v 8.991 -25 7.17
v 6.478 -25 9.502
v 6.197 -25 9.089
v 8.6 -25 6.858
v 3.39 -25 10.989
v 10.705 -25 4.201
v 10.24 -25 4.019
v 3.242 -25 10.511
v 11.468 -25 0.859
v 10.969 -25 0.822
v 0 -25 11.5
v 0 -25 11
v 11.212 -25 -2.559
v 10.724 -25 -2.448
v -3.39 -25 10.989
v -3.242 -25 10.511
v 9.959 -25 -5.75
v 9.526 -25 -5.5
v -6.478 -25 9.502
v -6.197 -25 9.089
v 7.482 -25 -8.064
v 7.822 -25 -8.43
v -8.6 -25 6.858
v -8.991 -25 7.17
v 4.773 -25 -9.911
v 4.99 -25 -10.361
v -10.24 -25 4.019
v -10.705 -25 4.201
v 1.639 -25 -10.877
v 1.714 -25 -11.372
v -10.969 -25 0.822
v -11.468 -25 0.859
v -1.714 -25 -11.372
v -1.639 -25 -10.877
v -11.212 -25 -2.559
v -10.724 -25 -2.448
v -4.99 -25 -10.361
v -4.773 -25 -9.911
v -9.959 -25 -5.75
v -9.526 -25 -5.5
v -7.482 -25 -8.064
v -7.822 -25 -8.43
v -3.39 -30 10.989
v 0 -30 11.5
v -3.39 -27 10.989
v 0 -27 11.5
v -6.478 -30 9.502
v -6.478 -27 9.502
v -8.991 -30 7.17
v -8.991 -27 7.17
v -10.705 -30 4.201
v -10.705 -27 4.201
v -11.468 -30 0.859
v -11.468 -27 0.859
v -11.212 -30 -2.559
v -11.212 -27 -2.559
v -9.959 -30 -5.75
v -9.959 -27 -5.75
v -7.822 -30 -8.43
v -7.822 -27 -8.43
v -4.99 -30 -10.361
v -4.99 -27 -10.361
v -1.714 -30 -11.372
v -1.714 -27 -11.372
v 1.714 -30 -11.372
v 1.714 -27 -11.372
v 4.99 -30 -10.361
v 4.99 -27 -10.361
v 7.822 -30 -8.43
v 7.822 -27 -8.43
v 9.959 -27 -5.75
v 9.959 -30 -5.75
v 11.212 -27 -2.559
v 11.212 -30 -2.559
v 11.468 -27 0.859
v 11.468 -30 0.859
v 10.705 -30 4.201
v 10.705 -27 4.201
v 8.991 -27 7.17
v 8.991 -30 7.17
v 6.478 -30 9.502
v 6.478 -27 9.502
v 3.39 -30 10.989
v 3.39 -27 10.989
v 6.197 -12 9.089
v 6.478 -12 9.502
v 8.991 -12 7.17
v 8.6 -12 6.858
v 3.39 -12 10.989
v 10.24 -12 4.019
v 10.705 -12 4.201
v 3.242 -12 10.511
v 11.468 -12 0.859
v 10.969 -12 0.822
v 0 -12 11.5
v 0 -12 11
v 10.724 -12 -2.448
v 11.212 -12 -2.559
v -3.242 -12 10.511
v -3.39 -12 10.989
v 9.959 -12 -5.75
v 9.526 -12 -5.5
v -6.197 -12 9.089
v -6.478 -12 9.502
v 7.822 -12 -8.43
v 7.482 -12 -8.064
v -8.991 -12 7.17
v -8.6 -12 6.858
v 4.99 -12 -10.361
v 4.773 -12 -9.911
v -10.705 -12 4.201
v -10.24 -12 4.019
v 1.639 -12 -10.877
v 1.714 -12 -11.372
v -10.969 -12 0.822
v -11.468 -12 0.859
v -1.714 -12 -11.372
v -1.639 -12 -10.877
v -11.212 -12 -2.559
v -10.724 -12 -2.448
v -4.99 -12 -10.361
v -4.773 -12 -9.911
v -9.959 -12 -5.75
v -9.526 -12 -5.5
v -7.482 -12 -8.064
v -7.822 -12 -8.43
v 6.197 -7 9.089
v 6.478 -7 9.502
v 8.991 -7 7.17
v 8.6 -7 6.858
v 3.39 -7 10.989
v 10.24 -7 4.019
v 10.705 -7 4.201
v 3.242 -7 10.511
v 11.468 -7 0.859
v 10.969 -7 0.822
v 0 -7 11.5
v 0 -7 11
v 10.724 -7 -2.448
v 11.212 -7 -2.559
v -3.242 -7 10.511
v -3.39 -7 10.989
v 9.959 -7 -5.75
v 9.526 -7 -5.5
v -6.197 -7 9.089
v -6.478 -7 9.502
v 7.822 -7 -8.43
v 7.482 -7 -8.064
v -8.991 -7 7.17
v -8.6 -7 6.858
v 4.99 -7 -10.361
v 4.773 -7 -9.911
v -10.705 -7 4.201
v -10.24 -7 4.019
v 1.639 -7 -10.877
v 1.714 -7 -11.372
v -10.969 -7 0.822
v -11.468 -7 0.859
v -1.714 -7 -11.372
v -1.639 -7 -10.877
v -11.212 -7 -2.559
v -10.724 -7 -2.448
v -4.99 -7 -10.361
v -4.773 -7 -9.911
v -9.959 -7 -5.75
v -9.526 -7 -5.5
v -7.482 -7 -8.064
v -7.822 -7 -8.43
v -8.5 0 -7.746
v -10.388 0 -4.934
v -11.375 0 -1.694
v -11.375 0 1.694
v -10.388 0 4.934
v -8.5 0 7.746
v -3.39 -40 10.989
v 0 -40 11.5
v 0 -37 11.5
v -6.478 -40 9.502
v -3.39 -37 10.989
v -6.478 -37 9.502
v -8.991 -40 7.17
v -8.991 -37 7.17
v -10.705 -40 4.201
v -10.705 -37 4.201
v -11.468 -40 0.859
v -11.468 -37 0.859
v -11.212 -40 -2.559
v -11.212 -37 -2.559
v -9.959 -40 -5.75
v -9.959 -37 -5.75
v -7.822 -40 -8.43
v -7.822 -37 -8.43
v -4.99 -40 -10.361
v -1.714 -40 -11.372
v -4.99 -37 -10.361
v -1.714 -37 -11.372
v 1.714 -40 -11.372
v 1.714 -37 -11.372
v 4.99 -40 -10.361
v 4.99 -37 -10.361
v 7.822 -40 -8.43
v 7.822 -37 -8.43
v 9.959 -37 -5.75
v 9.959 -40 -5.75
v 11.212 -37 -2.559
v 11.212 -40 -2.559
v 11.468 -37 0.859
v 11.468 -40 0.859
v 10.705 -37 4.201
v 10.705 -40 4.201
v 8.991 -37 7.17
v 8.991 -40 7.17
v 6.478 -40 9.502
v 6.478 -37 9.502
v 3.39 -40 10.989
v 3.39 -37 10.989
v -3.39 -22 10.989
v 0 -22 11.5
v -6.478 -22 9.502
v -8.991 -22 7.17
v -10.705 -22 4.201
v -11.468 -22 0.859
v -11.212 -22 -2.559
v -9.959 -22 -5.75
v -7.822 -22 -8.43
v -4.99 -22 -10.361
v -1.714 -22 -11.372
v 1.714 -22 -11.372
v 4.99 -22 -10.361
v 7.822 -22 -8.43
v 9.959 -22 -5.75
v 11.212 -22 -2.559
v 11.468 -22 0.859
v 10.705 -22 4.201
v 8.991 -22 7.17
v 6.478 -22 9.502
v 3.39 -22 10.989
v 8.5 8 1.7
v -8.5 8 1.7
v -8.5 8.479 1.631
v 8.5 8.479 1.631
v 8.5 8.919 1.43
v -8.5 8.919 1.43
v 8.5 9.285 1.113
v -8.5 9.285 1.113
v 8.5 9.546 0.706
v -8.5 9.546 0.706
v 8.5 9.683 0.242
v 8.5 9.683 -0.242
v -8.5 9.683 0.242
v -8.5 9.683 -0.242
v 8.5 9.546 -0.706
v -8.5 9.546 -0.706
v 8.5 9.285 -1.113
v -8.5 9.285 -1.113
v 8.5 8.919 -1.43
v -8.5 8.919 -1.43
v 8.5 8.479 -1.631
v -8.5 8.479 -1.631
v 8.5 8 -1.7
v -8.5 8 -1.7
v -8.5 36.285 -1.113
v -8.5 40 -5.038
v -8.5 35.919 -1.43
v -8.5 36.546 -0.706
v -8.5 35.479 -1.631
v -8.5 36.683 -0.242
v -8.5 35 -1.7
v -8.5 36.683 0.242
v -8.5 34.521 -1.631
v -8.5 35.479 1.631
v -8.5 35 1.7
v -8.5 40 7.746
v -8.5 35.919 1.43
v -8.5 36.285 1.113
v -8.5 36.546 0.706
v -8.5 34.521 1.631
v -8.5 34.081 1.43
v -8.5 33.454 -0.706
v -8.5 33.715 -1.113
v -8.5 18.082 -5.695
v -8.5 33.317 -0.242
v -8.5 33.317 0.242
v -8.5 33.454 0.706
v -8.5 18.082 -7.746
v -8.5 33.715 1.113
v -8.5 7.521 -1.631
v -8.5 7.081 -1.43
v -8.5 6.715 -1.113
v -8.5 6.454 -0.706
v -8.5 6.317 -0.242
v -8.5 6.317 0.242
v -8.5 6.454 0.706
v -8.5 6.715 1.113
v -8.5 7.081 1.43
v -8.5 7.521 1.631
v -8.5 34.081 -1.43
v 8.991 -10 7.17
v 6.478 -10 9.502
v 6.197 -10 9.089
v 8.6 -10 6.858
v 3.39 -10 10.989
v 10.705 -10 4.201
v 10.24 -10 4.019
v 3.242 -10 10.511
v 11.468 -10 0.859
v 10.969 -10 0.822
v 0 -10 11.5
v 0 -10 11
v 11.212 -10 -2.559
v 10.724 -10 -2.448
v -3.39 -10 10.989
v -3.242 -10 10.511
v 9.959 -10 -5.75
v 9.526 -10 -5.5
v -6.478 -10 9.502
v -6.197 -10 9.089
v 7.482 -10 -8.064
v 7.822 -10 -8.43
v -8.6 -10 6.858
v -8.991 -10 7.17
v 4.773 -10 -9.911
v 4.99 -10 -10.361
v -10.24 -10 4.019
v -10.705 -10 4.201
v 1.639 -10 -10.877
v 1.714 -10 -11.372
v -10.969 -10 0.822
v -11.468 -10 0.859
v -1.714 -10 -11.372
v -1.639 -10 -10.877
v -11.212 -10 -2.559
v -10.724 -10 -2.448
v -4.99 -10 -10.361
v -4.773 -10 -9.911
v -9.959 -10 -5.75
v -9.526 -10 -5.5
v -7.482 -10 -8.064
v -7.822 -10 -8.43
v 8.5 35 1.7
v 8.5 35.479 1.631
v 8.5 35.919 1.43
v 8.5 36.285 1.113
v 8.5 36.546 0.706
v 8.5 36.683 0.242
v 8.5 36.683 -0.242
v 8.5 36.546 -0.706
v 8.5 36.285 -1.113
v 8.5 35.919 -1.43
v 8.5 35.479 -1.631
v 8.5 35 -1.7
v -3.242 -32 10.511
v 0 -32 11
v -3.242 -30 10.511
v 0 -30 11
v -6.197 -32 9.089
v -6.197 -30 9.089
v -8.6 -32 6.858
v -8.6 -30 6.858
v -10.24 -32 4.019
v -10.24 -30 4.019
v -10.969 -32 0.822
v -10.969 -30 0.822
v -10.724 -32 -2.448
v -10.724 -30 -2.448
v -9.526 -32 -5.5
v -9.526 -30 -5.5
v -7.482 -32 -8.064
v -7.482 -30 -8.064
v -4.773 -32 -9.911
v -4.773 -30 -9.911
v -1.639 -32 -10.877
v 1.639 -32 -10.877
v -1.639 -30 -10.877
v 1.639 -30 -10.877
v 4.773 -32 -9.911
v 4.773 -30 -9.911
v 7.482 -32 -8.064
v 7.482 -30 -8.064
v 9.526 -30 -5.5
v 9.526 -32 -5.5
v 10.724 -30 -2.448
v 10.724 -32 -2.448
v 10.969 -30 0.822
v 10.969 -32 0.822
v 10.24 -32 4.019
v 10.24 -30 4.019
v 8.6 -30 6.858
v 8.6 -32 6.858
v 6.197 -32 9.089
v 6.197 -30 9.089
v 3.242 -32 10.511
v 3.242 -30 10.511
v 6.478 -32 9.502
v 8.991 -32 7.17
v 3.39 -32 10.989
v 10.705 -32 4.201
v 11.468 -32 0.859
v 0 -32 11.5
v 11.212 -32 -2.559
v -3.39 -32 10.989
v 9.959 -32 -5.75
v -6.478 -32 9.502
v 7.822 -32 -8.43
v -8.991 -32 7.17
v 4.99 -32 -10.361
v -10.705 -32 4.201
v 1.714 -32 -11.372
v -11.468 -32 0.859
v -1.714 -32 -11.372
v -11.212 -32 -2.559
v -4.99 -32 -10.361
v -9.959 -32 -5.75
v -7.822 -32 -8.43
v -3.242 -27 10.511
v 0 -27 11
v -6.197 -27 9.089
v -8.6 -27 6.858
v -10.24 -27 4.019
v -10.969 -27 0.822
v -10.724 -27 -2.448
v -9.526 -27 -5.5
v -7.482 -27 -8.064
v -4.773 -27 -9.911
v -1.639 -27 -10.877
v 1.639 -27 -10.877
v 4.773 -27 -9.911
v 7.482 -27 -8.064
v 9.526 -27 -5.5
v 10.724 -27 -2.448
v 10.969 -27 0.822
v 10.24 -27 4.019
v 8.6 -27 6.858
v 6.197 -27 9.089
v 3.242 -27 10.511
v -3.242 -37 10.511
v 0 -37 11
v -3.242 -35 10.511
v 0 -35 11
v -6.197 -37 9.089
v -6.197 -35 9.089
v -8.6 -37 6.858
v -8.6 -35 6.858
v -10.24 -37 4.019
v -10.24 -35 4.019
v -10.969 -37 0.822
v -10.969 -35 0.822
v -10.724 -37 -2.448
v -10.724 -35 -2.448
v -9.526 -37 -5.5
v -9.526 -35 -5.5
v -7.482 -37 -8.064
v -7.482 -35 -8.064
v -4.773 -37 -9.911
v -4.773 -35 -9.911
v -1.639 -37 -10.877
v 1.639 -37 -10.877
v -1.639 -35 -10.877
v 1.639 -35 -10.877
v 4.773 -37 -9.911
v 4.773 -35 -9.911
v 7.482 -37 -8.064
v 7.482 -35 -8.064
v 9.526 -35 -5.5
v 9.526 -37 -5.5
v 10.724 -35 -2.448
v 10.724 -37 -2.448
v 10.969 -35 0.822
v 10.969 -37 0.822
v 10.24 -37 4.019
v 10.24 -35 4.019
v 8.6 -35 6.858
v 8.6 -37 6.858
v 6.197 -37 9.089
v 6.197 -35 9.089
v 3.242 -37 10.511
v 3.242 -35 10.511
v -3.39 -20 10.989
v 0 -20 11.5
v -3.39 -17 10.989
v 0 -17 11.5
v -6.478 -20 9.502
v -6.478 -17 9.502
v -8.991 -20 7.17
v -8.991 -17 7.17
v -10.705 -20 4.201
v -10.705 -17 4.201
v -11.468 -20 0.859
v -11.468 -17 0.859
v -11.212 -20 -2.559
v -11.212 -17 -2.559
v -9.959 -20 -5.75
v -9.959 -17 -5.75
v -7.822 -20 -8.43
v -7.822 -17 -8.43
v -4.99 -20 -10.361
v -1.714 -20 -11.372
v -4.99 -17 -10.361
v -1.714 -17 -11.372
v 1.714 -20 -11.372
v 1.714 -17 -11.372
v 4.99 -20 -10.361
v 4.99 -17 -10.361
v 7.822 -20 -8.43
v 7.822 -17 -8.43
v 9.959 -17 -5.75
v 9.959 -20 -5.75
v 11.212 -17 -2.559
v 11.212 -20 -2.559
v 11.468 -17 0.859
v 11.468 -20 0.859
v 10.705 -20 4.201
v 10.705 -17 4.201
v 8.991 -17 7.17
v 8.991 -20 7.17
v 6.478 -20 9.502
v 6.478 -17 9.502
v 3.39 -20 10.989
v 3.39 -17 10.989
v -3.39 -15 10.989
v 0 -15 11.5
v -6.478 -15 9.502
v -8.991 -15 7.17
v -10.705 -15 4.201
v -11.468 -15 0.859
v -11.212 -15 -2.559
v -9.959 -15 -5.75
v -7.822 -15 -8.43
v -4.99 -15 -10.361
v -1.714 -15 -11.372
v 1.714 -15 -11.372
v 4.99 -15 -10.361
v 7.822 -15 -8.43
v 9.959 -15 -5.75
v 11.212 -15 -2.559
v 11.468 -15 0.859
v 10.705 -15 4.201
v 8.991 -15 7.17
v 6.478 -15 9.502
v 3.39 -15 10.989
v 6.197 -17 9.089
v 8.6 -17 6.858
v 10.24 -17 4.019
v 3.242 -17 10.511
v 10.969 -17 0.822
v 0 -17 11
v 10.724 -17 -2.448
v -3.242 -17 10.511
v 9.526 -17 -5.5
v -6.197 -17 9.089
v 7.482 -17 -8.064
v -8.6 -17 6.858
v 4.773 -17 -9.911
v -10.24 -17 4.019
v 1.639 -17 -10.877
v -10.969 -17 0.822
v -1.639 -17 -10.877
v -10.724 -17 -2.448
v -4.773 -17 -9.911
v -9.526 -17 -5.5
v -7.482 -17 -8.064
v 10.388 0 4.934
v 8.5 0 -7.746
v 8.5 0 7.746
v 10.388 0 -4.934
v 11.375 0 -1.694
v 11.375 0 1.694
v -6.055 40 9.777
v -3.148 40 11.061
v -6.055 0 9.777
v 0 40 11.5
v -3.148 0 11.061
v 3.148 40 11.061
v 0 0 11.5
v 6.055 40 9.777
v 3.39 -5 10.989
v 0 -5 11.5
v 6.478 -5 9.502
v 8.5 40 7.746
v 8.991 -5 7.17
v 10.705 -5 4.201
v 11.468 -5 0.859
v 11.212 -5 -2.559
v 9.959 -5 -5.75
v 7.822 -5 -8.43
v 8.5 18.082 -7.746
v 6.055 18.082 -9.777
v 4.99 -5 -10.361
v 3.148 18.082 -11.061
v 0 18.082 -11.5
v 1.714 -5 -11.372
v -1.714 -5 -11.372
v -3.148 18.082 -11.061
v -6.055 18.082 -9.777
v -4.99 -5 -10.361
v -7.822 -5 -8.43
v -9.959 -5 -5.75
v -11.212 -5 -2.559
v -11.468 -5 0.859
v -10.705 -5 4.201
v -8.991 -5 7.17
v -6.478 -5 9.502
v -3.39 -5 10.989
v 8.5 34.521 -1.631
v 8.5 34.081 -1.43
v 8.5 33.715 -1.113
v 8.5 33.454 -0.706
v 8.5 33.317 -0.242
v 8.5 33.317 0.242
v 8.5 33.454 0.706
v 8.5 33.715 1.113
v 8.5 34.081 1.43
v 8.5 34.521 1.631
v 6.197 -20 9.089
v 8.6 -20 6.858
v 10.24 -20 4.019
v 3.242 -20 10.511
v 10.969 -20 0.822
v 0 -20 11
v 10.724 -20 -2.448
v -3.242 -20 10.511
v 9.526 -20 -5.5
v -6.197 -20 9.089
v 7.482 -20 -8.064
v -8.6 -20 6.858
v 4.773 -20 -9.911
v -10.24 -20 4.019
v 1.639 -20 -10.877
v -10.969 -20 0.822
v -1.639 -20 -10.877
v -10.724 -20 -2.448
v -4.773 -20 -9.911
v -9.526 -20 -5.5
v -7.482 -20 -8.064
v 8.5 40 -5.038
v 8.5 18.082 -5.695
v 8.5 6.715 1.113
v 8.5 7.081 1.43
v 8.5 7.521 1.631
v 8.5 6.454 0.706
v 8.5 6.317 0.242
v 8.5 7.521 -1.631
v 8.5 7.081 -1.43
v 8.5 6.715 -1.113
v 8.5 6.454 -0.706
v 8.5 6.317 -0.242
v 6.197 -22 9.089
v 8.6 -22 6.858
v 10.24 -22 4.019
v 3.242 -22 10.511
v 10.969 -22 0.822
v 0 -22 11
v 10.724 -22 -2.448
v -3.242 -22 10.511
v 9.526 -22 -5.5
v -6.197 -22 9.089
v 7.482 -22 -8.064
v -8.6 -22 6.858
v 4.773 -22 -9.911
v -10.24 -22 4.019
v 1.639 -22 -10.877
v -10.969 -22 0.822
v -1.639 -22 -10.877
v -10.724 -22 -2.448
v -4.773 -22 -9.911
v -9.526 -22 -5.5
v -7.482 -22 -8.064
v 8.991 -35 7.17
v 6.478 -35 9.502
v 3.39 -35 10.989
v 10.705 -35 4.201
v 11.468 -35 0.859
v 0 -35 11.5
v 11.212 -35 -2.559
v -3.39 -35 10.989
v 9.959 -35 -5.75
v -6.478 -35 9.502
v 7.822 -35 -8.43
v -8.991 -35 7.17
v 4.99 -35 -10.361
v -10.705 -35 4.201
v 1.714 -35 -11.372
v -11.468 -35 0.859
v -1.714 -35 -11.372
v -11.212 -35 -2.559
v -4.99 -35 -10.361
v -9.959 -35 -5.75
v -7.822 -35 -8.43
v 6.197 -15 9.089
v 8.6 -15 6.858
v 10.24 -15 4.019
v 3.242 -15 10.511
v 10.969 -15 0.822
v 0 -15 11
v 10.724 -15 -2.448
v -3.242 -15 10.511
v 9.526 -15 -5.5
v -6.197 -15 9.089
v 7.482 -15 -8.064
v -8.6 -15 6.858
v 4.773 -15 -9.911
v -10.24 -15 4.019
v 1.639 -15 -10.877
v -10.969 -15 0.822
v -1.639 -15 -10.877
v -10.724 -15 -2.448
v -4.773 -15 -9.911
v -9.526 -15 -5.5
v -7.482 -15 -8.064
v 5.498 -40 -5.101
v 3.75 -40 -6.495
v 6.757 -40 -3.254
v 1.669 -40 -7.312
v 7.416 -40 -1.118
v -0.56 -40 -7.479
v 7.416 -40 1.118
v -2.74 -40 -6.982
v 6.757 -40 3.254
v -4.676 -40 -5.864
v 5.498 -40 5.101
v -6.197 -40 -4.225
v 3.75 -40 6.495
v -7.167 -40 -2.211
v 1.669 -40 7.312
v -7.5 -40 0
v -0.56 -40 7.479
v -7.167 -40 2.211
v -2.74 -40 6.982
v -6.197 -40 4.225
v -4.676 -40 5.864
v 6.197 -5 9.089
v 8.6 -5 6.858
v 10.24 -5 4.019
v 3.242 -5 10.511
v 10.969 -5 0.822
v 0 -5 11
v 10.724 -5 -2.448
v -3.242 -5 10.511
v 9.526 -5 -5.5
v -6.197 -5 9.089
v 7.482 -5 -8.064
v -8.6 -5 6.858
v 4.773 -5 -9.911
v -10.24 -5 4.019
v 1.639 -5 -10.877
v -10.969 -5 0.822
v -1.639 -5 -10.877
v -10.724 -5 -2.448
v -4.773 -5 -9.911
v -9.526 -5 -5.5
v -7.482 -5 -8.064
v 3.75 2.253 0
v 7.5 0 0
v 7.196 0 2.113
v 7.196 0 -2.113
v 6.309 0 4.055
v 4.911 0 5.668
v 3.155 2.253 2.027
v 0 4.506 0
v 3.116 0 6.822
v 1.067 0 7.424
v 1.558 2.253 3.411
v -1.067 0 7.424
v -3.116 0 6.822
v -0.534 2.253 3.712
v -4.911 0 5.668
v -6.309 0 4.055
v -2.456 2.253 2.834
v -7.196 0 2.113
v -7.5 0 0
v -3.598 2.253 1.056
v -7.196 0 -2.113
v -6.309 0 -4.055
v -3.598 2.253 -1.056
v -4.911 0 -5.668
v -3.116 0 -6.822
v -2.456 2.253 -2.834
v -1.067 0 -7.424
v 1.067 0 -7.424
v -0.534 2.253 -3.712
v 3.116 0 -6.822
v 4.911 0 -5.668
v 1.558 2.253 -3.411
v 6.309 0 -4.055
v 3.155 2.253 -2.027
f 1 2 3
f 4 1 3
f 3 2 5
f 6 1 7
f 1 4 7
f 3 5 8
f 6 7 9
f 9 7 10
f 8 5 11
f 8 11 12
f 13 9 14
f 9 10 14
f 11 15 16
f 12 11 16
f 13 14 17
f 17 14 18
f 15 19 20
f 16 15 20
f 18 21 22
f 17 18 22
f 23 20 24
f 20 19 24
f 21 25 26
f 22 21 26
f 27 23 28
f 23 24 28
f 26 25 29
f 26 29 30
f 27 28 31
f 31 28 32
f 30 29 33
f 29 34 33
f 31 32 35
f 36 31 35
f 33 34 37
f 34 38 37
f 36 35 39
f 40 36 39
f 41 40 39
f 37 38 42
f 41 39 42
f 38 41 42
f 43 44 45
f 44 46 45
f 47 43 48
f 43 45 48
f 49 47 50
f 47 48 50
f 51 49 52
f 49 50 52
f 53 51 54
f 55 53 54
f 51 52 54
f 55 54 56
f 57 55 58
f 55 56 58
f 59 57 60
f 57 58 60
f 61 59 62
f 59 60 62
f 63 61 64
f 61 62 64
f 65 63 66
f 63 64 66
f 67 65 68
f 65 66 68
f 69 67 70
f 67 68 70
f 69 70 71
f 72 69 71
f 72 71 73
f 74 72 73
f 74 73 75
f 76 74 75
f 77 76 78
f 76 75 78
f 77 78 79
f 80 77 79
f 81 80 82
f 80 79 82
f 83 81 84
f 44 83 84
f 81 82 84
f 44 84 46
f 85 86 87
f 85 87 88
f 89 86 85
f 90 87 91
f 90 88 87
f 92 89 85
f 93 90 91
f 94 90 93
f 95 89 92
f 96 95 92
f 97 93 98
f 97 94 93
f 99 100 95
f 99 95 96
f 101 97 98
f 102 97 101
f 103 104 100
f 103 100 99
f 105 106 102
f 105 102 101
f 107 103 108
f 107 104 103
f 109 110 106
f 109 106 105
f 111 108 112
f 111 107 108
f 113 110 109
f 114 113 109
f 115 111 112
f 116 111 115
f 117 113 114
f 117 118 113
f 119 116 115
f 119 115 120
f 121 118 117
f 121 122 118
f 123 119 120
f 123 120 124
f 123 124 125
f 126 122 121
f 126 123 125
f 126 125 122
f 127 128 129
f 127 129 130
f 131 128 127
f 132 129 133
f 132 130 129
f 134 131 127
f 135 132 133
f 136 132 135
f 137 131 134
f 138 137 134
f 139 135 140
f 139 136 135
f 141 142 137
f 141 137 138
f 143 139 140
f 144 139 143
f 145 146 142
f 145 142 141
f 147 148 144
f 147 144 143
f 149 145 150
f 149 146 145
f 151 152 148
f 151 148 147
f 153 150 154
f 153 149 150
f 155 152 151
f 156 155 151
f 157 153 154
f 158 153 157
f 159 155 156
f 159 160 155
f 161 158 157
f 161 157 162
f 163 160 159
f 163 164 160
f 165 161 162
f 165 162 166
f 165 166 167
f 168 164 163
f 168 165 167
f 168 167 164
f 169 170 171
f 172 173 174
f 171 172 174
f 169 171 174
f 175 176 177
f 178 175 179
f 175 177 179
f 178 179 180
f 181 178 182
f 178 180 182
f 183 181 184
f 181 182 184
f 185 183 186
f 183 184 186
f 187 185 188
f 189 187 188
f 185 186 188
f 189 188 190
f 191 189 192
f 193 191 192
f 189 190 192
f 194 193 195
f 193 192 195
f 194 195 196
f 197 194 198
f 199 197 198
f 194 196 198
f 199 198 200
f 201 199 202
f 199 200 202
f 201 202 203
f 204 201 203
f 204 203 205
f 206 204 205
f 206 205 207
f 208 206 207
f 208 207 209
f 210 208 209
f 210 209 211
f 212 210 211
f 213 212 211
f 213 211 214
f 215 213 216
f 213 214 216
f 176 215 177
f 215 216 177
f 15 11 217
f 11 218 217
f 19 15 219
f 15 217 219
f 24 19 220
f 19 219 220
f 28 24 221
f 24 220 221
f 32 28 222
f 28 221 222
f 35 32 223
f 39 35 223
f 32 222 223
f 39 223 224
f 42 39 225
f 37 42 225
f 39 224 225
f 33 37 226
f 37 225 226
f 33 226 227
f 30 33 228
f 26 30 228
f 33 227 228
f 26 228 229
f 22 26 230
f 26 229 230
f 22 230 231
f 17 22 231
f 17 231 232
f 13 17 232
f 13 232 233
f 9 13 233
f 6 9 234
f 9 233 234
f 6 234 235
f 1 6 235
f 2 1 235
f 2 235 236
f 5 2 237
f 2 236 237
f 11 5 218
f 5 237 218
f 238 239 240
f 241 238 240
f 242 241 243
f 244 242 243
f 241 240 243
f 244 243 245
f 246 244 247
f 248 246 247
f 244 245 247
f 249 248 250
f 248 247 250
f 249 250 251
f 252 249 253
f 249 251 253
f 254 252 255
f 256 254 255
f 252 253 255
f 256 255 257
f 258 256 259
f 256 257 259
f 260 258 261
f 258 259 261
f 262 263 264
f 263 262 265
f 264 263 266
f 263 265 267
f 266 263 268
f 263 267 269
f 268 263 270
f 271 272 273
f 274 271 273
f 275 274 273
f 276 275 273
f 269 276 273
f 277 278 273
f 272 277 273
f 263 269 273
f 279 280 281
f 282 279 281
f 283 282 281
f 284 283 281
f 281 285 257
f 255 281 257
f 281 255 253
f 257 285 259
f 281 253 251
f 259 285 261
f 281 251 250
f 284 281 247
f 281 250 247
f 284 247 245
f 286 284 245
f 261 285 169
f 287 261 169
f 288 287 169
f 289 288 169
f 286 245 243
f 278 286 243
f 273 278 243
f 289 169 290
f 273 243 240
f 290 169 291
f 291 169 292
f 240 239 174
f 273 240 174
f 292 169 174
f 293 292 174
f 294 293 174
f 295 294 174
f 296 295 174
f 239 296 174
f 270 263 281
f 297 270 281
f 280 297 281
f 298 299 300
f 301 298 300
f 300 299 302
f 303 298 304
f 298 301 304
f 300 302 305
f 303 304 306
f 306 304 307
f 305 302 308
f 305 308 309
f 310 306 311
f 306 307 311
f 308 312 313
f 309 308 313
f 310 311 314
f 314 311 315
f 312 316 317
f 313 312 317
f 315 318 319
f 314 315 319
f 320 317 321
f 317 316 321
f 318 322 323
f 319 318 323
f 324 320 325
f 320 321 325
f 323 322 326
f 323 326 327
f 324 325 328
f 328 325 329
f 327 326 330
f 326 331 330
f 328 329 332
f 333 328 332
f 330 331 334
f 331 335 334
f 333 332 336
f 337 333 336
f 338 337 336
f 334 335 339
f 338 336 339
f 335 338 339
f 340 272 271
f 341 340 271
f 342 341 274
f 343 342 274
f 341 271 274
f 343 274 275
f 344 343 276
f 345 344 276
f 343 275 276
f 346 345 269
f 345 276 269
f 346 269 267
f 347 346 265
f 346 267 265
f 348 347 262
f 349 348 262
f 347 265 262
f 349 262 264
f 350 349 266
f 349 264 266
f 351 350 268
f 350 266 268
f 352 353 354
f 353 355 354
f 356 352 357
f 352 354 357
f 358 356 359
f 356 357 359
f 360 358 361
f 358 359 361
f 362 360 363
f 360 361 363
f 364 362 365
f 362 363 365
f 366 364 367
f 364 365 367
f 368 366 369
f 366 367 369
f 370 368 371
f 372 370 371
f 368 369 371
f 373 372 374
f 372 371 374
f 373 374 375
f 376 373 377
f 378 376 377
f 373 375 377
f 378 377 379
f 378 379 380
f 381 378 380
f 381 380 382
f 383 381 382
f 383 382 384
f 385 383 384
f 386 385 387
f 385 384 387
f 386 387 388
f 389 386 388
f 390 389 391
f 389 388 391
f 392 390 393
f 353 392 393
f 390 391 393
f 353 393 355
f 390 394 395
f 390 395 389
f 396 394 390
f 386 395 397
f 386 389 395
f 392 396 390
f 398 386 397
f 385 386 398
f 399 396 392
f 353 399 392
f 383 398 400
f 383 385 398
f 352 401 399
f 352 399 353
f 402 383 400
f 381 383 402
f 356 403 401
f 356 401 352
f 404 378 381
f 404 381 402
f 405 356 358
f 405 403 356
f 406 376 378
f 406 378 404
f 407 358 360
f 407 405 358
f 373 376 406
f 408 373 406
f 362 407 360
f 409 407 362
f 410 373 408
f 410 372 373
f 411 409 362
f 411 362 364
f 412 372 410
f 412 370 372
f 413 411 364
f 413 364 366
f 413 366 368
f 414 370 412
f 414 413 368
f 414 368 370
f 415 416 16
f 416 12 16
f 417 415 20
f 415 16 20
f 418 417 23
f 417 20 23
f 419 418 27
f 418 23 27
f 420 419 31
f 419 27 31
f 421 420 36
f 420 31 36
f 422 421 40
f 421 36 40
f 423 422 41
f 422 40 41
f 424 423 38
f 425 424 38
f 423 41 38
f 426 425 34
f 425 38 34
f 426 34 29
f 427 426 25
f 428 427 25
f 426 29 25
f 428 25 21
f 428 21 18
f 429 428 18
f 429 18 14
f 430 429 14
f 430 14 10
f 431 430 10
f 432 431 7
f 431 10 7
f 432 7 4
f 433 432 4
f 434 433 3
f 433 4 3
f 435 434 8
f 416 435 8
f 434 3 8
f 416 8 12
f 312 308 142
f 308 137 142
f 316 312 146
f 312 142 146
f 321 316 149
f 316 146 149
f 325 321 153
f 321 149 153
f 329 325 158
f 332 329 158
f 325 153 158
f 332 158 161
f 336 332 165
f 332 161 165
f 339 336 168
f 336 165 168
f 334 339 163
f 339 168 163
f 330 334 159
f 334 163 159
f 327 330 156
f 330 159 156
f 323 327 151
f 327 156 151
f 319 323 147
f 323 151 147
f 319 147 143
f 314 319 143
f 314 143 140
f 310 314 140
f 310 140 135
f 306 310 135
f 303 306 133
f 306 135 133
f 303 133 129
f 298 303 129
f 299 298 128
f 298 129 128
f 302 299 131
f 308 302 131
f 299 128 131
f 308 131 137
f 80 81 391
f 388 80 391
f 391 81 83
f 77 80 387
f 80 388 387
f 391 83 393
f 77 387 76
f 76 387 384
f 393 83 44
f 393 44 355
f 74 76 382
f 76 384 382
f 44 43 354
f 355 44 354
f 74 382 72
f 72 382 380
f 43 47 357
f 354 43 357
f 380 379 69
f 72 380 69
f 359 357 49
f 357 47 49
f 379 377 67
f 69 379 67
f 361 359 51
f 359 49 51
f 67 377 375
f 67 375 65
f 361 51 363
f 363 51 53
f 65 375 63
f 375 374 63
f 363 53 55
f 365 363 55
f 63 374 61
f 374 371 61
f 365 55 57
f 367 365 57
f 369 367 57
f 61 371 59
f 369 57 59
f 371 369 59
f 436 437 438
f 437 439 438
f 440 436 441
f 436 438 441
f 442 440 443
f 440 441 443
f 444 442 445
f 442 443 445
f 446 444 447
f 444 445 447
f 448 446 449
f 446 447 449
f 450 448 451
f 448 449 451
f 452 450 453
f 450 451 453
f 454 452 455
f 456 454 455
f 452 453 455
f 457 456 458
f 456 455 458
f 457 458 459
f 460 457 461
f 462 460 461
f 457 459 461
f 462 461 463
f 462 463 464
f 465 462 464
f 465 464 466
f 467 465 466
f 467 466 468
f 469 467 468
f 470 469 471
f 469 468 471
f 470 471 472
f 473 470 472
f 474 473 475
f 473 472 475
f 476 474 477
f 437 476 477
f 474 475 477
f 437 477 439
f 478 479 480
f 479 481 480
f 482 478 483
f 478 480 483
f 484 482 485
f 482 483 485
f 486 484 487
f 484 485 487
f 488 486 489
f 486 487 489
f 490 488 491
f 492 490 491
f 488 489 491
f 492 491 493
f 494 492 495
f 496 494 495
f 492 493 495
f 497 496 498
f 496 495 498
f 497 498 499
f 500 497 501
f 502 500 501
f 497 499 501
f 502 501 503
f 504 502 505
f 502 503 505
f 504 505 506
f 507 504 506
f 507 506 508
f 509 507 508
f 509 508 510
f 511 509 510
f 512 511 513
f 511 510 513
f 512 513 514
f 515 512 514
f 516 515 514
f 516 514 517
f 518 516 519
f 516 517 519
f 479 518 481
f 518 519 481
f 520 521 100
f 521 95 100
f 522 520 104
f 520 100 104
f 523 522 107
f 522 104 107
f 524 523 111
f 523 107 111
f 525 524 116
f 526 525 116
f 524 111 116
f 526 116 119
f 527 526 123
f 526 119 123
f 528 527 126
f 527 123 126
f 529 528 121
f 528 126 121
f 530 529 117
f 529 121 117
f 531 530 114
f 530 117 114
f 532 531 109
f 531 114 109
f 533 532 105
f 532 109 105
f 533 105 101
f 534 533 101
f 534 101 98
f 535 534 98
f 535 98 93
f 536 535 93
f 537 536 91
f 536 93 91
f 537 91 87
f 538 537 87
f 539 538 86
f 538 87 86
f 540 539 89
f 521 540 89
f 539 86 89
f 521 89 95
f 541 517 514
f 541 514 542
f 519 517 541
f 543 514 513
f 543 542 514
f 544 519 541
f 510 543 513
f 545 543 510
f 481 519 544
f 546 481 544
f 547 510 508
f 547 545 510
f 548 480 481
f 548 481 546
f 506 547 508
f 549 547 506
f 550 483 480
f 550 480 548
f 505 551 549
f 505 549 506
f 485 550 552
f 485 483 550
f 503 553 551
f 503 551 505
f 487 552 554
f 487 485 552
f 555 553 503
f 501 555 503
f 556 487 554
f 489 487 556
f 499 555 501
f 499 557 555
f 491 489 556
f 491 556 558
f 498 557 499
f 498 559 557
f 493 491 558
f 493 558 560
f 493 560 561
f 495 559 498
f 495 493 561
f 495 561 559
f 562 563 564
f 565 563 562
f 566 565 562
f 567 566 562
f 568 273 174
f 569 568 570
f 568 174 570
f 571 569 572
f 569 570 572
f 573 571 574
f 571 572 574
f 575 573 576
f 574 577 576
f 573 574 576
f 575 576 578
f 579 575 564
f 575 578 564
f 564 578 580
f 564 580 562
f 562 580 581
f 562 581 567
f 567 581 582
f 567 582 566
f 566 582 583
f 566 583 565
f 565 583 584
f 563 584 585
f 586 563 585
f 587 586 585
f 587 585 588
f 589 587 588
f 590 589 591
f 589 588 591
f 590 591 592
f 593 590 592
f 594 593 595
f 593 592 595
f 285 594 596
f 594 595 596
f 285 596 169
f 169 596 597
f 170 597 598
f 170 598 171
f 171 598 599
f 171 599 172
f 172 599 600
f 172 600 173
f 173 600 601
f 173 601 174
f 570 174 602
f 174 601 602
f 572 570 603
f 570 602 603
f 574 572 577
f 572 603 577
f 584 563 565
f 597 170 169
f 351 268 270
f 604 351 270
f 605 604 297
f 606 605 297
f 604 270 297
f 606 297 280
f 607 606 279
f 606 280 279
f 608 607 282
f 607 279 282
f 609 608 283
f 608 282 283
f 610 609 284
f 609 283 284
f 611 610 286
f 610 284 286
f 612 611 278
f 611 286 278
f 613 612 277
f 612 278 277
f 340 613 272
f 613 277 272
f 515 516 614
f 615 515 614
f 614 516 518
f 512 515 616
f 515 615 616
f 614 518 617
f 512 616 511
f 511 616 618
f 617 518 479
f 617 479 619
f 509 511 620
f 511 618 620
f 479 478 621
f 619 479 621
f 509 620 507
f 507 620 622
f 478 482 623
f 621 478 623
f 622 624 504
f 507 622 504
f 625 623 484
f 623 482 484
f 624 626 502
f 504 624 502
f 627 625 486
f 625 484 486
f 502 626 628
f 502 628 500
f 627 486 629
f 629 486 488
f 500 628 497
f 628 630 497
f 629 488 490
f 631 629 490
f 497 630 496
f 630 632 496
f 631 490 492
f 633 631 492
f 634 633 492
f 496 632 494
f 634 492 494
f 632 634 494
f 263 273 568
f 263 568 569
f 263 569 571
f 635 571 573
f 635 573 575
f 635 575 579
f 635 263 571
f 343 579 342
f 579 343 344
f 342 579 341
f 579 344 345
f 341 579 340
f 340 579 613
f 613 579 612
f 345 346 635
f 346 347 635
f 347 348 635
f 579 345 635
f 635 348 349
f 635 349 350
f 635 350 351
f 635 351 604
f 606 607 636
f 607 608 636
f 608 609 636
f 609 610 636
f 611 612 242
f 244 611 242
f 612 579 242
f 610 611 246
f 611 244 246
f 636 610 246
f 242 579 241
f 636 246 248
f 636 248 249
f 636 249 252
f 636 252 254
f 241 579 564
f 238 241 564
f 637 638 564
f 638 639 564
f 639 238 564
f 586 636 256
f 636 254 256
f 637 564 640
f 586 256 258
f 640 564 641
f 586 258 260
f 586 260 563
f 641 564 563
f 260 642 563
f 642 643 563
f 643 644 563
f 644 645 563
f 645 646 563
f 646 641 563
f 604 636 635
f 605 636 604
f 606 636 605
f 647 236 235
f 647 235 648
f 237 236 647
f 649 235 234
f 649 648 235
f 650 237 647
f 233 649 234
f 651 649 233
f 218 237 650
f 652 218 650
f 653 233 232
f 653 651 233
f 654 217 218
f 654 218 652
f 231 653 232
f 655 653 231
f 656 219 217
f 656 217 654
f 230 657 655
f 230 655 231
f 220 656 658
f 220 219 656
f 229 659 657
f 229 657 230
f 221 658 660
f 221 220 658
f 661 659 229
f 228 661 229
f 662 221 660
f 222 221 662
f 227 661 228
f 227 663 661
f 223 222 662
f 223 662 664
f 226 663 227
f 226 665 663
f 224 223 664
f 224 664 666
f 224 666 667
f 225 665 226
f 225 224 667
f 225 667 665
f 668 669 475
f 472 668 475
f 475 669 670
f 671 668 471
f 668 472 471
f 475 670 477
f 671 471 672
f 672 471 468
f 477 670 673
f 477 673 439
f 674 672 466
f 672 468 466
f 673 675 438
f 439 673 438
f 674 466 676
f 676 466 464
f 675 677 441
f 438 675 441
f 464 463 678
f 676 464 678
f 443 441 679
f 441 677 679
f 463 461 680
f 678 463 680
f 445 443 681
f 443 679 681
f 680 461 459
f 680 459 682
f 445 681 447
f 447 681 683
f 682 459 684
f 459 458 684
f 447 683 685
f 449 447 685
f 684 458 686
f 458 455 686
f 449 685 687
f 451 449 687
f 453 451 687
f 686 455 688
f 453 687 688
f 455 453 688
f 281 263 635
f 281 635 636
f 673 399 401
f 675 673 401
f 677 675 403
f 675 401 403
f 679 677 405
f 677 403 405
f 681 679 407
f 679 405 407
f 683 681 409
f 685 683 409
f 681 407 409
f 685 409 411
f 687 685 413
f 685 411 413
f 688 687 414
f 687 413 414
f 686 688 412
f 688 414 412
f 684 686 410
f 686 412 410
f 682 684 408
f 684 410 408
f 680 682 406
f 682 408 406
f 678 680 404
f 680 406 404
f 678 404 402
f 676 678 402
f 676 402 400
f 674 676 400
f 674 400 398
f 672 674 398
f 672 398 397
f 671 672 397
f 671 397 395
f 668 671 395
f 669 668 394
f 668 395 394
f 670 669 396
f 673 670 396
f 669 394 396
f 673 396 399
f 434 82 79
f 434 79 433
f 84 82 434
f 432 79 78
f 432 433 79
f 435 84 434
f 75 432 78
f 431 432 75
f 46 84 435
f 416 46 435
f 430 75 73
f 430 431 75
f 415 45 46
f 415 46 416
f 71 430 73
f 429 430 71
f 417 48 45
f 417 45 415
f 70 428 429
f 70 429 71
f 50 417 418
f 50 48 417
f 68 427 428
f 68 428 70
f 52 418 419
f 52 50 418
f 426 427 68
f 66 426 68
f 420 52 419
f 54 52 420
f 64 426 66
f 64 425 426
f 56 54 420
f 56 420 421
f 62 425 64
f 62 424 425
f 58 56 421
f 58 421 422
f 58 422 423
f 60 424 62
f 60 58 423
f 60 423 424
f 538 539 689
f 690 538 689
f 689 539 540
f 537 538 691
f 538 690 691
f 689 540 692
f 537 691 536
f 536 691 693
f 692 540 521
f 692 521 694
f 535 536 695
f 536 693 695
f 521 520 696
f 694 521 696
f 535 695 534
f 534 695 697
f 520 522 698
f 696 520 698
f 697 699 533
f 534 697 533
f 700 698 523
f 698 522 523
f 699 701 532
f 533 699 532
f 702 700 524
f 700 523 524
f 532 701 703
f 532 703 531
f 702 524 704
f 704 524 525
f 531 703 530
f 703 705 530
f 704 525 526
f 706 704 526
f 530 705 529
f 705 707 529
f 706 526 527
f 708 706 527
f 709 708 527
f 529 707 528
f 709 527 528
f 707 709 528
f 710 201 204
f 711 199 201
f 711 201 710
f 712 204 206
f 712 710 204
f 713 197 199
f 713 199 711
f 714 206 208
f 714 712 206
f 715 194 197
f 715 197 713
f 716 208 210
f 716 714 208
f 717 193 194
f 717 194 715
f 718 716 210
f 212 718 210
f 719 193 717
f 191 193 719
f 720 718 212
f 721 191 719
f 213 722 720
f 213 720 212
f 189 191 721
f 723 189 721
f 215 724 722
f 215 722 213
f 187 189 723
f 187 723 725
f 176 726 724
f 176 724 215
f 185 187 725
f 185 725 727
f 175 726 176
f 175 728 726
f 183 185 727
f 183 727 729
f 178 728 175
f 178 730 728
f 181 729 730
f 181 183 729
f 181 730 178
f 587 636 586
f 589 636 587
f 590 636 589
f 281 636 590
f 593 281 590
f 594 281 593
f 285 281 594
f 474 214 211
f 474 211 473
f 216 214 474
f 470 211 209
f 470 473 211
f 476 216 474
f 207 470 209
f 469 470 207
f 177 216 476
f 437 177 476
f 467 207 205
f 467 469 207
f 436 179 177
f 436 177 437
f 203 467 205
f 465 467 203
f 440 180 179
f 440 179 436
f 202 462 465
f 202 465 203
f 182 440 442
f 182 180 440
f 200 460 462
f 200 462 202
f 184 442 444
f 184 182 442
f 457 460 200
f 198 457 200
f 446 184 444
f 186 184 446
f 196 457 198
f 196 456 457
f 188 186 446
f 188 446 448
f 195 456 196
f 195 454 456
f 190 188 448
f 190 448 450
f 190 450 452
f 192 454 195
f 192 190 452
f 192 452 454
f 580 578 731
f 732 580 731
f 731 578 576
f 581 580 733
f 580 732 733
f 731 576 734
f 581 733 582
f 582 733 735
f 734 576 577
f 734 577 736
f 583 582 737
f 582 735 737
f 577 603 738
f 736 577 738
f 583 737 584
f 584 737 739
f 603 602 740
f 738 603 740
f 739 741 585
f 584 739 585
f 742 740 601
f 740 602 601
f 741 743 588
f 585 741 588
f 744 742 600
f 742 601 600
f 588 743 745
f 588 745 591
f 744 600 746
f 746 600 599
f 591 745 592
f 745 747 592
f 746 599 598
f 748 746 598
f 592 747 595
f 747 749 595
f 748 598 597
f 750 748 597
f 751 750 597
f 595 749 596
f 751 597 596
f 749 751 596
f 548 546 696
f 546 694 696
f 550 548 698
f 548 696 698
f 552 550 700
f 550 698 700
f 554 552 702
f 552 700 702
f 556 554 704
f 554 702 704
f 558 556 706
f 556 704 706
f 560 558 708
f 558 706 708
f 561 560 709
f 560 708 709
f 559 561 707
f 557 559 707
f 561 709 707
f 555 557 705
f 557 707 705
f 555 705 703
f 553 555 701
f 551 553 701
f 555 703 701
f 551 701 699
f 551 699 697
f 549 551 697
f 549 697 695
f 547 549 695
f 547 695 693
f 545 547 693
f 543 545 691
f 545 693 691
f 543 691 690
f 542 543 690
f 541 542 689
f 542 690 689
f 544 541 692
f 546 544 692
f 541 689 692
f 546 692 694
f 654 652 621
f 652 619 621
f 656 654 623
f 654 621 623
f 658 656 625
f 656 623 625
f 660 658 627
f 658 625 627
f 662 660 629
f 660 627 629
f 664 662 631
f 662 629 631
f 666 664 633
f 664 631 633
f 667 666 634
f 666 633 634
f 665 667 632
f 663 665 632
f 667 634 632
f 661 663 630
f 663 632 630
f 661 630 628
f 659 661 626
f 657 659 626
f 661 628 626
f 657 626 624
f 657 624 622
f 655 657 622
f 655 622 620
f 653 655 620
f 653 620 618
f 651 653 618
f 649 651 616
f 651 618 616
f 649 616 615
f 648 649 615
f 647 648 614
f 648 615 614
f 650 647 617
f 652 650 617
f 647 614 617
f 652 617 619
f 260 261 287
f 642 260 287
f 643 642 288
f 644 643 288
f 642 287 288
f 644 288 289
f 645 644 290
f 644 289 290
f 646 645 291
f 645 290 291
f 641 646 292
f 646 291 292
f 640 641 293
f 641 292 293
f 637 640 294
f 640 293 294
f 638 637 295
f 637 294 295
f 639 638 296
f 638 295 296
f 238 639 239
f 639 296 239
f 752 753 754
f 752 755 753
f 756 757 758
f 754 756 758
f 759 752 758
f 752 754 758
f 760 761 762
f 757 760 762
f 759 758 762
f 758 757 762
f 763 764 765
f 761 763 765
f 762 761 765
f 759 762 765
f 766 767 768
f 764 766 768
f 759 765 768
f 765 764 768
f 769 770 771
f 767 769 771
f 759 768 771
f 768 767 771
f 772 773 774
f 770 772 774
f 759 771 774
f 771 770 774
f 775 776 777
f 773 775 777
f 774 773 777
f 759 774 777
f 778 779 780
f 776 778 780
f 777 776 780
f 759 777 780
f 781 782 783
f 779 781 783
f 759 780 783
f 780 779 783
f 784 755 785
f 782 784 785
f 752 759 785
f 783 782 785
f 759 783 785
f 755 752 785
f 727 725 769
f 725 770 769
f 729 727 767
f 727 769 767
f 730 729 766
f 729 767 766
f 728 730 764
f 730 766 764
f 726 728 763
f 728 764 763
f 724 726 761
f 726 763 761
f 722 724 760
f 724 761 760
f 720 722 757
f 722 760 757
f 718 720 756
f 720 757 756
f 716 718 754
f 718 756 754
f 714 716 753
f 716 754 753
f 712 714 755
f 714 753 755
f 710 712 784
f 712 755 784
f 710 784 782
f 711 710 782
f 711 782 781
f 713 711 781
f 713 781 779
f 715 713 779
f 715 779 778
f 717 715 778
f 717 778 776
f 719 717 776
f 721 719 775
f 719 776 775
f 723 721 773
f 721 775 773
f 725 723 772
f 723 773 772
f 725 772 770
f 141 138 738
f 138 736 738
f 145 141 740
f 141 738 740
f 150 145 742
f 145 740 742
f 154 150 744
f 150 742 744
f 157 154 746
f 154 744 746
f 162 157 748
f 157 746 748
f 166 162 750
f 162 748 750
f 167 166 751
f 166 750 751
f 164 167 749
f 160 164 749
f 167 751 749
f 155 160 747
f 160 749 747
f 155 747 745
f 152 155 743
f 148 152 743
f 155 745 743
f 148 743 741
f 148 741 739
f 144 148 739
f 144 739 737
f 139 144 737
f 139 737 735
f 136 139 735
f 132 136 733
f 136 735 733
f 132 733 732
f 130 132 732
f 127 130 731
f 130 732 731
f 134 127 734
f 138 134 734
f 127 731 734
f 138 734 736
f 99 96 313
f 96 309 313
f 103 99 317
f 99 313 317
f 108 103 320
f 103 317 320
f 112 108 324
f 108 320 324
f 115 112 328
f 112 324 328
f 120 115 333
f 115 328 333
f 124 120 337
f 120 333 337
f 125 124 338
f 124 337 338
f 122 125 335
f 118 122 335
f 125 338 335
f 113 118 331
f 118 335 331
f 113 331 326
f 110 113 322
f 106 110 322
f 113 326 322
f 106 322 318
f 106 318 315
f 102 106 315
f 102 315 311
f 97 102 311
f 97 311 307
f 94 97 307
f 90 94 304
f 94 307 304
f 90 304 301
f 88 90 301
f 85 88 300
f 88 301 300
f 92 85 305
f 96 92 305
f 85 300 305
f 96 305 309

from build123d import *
from build123d.topology import SkipClean

# Parameters (mm, degrees)
SKETCH2_W                      = 11.5
SKETCH2_H                      = 40
SKETCH3_W                      = 0.5
SKETCH3_H                      = 2
LPATTERN1_COUNT                = 7
LPATTERN1_PITCH                = 5
BOSS_EXTRUDE1_DEPTH            = 40
F_15_0_15_DIAMETER_HOLE1_D     = 15
F_15_0_15_DIAMETER_HOLE1_DEPTH = 40
F_15_0_15_DIAMETER_HOLE1_TIP   = 4.506454643
M3_CLEARANCE_HOLE1_D           = 3.4
CUT_EXTRUDE1_DEPTH             = 44.179856415
CUT_EXTRUDE1_DEPTH_BACK        = 44.179856415
SKETCH16_R                     = 1.7


with BuildPart() as part:
    # Sketch2 → Revolve1 (revolve)
    with BuildSketch(Plane.XY, mode=Mode.PRIVATE) as revolve1_sk:
        with Locations((-5.75, -20)):
            Rectangle(SKETCH2_W, SKETCH2_H)
    revolve(revolve1_sk.sketch.rotate(Axis((0, 0, 0), (0, -1, 0)), 270), axis=Axis((0, 0, 0), (0, -1, 0)))

    # Sketch3 → Cut-Revolve1 (revolve, cut)
    with BuildSketch(Plane.XY, mode=Mode.PRIVATE) as cut_revolve1_sk:
        with Locations((11.25, -36)):
            Rectangle(SKETCH3_W, SKETCH3_H)
    cut_revolve1 = revolve(cut_revolve1_sk.sketch.rotate(Axis((0, 0, 0), (0, -1, 0)), 90), axis=Axis((0, 0, 0), (0, -1, 0)), mode=Mode.SUBTRACT)

    # LPattern1: Cut-Revolve1 ×7
    with Locations(*[(0, i * LPATTERN1_PITCH, 0) for i in range(1, LPATTERN1_COUNT)]):
        add(cut_revolve1, mode=Mode.SUBTRACT)

    # Sketch6 → Boss-Extrude1 (add)
    with SkipClean():  # the faces are left unmerged after this step: merging them gives an invalid solid
        with BuildSketch(Plane(origin=(0, 0, 0), x_dir=(1, 0, 0), z_dir=(0, 1, 0))):
            with BuildLine():
                Line((-8.5, 7.745966692), (-8.5, -7.745966692))
                ThreePointArc((-8.5, -7.745966692), (0, -11.5), (8.5, -7.745966692))
                Line((8.5, -7.745966692), (8.5, 7.745966692))
                ThreePointArc((8.5, 7.745966692), (0, 11.5), (-8.5, 7.745966692))
            make_face()
        extrude(amount=BOSS_EXTRUDE1_DEPTH)

    # Ø15.0 (15) Diameter Hole1
    with Locations(Plane.XZ.offset(40)):
        with Locations((0, 0)):
            Hole(F_15_0_15_DIAMETER_HOLE1_D / 2, depth=F_15_0_15_DIAMETER_HOLE1_DEPTH)
            with Locations((0, 0, -(F_15_0_15_DIAMETER_HOLE1_DEPTH + F_15_0_15_DIAMETER_HOLE1_TIP / 2))):  # 118° drill point
                Cone(0, F_15_0_15_DIAMETER_HOLE1_D / 2, F_15_0_15_DIAMETER_HOLE1_TIP, mode=Mode.SUBTRACT)

    # M3 Clearance Hole1 (through all)
    with Locations(Plane(origin=(8.5, 0, 0), x_dir=(0, 0, -1), z_dir=(1, 0, 0))):
        with Locations((0, 8), (0, 35)):
            Hole(M3_CLEARANCE_HOLE1_D / 2)

    # Sketch16 → Cut-Extrude1 (cut, two sides: drawn at the far end of the back side and taken through both)
    with SkipClean():  # the faces are left unmerged after this step: merging them gives an invalid solid
        with BuildSketch(Plane(origin=(0, 0, 0), x_dir=(0, 0, -1), z_dir=(1, 0, 0)).offset(-CUT_EXTRUDE1_DEPTH_BACK)):
            with Locations((0, 8)):
                Circle(SKETCH16_R)
            with Locations((0, 35)):
                Circle(SKETCH16_R)
            Polygon((5.037728025, 40), (5.6954411, 18.081644681), (11.5, 18.081644681), (11.5, 40), (7.745966692, 40), align=None)
        extrude(amount=CUT_EXTRUDE1_DEPTH + CUT_EXTRUDE1_DEPTH_BACK, mode=Mode.SUBTRACT)


solid = part.part
